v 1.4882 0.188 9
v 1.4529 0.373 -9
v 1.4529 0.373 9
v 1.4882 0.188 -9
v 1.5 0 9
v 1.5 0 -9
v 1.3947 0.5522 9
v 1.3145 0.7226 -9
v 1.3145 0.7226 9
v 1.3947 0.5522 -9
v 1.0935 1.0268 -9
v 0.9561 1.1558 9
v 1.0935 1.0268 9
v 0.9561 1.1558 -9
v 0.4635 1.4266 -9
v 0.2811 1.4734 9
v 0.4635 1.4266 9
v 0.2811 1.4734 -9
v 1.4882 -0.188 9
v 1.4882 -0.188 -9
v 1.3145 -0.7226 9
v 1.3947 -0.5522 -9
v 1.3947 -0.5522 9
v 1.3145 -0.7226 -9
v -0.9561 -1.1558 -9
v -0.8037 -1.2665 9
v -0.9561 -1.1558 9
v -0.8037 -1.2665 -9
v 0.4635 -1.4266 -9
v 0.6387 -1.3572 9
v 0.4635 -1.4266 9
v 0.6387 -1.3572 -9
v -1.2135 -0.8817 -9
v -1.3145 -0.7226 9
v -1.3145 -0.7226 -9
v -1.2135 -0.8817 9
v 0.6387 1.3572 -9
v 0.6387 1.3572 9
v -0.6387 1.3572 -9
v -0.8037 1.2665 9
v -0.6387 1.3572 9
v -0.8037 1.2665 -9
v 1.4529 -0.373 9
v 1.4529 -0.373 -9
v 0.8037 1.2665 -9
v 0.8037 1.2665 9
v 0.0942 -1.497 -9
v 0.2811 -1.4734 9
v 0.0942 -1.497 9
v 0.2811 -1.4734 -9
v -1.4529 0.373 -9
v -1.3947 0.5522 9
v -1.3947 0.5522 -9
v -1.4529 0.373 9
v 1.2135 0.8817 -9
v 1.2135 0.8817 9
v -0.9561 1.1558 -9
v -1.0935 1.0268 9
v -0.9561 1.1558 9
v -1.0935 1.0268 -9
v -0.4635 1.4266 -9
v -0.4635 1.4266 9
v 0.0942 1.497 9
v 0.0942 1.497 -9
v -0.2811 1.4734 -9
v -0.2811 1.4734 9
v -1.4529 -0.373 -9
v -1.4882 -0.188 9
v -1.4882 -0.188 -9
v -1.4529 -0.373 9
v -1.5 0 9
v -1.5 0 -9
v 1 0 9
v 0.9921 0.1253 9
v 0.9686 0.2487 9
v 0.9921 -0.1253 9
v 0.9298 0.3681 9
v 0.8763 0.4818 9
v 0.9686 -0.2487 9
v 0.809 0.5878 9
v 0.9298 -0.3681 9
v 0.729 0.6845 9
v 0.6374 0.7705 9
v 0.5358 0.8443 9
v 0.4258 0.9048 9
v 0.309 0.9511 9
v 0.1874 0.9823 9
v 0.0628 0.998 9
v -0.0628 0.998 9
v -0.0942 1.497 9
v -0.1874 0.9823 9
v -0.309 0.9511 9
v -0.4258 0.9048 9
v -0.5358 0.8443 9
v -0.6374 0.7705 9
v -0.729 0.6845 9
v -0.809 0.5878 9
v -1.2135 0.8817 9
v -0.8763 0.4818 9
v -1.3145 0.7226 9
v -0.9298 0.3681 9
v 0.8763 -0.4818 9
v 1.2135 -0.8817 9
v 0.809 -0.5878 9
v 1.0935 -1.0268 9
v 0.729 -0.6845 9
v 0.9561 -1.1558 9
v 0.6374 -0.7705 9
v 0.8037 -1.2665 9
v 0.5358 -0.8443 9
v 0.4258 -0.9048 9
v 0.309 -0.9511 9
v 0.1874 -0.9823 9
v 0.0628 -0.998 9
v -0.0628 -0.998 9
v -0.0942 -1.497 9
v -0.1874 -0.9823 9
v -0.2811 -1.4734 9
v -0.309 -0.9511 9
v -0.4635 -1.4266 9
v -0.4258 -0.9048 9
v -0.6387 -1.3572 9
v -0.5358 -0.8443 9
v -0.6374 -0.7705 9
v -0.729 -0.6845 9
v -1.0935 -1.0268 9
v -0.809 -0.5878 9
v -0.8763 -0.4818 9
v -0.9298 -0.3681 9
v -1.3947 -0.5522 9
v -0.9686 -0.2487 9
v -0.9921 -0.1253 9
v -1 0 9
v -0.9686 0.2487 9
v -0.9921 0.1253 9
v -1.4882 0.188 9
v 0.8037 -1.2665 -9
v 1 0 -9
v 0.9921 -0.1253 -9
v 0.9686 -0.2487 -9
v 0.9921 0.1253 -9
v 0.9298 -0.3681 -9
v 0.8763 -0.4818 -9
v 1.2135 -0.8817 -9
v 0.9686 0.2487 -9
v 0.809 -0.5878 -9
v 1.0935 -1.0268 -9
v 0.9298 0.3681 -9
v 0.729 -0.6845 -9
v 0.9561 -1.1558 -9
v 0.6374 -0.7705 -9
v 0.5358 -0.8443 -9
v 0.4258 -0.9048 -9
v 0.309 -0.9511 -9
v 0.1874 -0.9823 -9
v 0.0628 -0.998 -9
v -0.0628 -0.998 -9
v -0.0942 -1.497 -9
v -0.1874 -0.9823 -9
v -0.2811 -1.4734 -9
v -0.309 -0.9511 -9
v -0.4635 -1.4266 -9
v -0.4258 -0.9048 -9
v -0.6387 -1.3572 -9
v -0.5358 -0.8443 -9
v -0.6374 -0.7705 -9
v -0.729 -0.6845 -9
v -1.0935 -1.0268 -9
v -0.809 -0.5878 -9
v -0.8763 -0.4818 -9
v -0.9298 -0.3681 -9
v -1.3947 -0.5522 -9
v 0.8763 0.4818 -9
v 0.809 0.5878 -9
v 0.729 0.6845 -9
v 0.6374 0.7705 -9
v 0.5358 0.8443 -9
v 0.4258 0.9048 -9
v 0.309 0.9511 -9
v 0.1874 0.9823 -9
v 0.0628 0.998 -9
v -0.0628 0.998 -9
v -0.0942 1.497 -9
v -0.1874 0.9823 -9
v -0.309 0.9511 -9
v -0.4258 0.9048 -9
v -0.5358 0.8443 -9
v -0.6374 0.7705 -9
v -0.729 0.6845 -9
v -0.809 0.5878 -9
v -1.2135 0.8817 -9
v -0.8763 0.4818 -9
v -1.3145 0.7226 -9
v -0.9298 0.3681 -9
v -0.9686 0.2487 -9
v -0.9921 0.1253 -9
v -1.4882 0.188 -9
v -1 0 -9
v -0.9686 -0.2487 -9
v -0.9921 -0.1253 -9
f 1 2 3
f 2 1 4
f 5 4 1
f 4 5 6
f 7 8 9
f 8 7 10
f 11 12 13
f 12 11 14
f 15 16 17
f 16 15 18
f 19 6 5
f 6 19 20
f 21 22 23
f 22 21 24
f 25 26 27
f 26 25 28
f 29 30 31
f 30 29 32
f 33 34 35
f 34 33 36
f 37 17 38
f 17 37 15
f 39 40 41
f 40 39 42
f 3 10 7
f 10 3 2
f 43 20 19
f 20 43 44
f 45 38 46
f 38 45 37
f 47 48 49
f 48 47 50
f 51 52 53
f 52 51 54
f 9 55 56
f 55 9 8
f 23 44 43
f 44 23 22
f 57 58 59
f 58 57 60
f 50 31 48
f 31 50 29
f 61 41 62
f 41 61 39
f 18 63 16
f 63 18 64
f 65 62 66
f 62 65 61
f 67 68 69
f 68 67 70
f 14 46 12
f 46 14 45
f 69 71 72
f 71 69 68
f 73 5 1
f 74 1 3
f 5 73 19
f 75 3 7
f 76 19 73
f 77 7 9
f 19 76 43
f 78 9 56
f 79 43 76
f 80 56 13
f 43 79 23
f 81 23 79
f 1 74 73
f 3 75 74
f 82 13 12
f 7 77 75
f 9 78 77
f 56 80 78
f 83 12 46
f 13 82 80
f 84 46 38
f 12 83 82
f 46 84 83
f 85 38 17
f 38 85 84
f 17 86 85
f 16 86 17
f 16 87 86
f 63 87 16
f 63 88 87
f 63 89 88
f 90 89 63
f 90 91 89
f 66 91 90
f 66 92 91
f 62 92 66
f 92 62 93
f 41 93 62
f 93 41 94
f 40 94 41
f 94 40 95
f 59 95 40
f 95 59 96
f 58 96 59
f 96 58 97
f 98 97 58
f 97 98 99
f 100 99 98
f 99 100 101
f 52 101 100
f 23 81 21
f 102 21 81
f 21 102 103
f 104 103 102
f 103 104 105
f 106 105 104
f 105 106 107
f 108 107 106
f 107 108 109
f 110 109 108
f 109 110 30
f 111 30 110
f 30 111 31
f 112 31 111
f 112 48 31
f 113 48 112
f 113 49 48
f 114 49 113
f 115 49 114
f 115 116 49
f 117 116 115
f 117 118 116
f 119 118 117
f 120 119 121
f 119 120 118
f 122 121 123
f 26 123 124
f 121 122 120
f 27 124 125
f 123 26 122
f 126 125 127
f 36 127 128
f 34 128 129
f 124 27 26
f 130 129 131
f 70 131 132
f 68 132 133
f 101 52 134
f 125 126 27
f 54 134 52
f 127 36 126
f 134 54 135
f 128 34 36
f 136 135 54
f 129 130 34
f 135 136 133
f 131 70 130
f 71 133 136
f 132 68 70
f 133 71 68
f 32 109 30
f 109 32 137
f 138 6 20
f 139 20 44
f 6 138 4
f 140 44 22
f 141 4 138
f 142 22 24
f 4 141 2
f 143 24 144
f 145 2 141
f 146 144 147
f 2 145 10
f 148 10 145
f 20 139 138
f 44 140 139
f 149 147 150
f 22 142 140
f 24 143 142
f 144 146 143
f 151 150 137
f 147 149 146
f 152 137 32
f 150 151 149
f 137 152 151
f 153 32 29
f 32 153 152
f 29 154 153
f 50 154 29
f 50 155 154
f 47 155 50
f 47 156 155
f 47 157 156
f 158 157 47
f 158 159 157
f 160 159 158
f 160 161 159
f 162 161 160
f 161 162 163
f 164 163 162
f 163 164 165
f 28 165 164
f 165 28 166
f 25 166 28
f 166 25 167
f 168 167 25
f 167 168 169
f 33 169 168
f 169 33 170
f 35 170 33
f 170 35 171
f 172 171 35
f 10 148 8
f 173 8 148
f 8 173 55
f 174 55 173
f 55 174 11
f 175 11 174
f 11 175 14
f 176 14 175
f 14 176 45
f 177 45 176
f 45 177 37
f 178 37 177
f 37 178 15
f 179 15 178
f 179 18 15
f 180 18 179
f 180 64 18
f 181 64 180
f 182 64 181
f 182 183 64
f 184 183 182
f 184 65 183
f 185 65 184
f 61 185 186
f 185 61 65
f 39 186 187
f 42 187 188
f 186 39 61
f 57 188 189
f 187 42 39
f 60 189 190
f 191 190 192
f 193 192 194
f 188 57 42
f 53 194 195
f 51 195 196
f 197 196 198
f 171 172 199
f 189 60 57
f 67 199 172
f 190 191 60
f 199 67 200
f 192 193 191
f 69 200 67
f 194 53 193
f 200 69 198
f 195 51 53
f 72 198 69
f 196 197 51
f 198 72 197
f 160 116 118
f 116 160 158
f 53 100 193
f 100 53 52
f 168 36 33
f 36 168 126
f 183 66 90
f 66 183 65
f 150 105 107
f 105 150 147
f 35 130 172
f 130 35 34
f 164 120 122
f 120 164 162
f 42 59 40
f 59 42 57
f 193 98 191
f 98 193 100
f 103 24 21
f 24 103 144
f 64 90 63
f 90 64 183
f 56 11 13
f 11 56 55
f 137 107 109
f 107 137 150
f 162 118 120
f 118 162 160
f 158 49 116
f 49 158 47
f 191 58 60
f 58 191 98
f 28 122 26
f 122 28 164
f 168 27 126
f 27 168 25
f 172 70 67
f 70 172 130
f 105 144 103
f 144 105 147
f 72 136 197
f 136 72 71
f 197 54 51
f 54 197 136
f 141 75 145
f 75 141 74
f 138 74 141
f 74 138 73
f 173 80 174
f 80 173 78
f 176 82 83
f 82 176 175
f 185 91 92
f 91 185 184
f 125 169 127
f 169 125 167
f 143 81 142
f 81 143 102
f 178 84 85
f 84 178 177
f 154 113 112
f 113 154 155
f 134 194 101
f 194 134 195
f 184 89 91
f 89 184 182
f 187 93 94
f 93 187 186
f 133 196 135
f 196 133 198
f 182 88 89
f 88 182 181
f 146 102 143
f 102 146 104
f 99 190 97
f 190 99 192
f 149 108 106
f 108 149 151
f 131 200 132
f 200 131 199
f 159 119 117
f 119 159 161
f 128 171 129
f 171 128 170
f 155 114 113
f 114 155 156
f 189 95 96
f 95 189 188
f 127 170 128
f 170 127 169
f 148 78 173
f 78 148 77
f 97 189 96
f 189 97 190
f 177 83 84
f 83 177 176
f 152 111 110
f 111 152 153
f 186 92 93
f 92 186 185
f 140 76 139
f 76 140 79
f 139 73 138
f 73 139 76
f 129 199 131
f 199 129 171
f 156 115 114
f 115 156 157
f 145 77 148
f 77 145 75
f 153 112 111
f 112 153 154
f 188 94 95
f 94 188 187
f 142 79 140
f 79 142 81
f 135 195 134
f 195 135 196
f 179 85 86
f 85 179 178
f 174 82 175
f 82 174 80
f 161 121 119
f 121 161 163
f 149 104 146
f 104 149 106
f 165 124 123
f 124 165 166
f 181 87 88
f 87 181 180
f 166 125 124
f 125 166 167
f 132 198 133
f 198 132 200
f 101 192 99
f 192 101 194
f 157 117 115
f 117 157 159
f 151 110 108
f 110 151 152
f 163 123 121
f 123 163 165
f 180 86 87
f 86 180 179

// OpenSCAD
$fn = 50;


difference() {
	union() {
		translate(v = [0, 0, -9.0000000000]) {
			cylinder(h = 18, r = 1.5000000000);
		}
	}
	union() {
		translate(v = [0, 0, -100.0000000000]) {
			cylinder(h = 200, r = 1.0000000000);
		}
	}
}
